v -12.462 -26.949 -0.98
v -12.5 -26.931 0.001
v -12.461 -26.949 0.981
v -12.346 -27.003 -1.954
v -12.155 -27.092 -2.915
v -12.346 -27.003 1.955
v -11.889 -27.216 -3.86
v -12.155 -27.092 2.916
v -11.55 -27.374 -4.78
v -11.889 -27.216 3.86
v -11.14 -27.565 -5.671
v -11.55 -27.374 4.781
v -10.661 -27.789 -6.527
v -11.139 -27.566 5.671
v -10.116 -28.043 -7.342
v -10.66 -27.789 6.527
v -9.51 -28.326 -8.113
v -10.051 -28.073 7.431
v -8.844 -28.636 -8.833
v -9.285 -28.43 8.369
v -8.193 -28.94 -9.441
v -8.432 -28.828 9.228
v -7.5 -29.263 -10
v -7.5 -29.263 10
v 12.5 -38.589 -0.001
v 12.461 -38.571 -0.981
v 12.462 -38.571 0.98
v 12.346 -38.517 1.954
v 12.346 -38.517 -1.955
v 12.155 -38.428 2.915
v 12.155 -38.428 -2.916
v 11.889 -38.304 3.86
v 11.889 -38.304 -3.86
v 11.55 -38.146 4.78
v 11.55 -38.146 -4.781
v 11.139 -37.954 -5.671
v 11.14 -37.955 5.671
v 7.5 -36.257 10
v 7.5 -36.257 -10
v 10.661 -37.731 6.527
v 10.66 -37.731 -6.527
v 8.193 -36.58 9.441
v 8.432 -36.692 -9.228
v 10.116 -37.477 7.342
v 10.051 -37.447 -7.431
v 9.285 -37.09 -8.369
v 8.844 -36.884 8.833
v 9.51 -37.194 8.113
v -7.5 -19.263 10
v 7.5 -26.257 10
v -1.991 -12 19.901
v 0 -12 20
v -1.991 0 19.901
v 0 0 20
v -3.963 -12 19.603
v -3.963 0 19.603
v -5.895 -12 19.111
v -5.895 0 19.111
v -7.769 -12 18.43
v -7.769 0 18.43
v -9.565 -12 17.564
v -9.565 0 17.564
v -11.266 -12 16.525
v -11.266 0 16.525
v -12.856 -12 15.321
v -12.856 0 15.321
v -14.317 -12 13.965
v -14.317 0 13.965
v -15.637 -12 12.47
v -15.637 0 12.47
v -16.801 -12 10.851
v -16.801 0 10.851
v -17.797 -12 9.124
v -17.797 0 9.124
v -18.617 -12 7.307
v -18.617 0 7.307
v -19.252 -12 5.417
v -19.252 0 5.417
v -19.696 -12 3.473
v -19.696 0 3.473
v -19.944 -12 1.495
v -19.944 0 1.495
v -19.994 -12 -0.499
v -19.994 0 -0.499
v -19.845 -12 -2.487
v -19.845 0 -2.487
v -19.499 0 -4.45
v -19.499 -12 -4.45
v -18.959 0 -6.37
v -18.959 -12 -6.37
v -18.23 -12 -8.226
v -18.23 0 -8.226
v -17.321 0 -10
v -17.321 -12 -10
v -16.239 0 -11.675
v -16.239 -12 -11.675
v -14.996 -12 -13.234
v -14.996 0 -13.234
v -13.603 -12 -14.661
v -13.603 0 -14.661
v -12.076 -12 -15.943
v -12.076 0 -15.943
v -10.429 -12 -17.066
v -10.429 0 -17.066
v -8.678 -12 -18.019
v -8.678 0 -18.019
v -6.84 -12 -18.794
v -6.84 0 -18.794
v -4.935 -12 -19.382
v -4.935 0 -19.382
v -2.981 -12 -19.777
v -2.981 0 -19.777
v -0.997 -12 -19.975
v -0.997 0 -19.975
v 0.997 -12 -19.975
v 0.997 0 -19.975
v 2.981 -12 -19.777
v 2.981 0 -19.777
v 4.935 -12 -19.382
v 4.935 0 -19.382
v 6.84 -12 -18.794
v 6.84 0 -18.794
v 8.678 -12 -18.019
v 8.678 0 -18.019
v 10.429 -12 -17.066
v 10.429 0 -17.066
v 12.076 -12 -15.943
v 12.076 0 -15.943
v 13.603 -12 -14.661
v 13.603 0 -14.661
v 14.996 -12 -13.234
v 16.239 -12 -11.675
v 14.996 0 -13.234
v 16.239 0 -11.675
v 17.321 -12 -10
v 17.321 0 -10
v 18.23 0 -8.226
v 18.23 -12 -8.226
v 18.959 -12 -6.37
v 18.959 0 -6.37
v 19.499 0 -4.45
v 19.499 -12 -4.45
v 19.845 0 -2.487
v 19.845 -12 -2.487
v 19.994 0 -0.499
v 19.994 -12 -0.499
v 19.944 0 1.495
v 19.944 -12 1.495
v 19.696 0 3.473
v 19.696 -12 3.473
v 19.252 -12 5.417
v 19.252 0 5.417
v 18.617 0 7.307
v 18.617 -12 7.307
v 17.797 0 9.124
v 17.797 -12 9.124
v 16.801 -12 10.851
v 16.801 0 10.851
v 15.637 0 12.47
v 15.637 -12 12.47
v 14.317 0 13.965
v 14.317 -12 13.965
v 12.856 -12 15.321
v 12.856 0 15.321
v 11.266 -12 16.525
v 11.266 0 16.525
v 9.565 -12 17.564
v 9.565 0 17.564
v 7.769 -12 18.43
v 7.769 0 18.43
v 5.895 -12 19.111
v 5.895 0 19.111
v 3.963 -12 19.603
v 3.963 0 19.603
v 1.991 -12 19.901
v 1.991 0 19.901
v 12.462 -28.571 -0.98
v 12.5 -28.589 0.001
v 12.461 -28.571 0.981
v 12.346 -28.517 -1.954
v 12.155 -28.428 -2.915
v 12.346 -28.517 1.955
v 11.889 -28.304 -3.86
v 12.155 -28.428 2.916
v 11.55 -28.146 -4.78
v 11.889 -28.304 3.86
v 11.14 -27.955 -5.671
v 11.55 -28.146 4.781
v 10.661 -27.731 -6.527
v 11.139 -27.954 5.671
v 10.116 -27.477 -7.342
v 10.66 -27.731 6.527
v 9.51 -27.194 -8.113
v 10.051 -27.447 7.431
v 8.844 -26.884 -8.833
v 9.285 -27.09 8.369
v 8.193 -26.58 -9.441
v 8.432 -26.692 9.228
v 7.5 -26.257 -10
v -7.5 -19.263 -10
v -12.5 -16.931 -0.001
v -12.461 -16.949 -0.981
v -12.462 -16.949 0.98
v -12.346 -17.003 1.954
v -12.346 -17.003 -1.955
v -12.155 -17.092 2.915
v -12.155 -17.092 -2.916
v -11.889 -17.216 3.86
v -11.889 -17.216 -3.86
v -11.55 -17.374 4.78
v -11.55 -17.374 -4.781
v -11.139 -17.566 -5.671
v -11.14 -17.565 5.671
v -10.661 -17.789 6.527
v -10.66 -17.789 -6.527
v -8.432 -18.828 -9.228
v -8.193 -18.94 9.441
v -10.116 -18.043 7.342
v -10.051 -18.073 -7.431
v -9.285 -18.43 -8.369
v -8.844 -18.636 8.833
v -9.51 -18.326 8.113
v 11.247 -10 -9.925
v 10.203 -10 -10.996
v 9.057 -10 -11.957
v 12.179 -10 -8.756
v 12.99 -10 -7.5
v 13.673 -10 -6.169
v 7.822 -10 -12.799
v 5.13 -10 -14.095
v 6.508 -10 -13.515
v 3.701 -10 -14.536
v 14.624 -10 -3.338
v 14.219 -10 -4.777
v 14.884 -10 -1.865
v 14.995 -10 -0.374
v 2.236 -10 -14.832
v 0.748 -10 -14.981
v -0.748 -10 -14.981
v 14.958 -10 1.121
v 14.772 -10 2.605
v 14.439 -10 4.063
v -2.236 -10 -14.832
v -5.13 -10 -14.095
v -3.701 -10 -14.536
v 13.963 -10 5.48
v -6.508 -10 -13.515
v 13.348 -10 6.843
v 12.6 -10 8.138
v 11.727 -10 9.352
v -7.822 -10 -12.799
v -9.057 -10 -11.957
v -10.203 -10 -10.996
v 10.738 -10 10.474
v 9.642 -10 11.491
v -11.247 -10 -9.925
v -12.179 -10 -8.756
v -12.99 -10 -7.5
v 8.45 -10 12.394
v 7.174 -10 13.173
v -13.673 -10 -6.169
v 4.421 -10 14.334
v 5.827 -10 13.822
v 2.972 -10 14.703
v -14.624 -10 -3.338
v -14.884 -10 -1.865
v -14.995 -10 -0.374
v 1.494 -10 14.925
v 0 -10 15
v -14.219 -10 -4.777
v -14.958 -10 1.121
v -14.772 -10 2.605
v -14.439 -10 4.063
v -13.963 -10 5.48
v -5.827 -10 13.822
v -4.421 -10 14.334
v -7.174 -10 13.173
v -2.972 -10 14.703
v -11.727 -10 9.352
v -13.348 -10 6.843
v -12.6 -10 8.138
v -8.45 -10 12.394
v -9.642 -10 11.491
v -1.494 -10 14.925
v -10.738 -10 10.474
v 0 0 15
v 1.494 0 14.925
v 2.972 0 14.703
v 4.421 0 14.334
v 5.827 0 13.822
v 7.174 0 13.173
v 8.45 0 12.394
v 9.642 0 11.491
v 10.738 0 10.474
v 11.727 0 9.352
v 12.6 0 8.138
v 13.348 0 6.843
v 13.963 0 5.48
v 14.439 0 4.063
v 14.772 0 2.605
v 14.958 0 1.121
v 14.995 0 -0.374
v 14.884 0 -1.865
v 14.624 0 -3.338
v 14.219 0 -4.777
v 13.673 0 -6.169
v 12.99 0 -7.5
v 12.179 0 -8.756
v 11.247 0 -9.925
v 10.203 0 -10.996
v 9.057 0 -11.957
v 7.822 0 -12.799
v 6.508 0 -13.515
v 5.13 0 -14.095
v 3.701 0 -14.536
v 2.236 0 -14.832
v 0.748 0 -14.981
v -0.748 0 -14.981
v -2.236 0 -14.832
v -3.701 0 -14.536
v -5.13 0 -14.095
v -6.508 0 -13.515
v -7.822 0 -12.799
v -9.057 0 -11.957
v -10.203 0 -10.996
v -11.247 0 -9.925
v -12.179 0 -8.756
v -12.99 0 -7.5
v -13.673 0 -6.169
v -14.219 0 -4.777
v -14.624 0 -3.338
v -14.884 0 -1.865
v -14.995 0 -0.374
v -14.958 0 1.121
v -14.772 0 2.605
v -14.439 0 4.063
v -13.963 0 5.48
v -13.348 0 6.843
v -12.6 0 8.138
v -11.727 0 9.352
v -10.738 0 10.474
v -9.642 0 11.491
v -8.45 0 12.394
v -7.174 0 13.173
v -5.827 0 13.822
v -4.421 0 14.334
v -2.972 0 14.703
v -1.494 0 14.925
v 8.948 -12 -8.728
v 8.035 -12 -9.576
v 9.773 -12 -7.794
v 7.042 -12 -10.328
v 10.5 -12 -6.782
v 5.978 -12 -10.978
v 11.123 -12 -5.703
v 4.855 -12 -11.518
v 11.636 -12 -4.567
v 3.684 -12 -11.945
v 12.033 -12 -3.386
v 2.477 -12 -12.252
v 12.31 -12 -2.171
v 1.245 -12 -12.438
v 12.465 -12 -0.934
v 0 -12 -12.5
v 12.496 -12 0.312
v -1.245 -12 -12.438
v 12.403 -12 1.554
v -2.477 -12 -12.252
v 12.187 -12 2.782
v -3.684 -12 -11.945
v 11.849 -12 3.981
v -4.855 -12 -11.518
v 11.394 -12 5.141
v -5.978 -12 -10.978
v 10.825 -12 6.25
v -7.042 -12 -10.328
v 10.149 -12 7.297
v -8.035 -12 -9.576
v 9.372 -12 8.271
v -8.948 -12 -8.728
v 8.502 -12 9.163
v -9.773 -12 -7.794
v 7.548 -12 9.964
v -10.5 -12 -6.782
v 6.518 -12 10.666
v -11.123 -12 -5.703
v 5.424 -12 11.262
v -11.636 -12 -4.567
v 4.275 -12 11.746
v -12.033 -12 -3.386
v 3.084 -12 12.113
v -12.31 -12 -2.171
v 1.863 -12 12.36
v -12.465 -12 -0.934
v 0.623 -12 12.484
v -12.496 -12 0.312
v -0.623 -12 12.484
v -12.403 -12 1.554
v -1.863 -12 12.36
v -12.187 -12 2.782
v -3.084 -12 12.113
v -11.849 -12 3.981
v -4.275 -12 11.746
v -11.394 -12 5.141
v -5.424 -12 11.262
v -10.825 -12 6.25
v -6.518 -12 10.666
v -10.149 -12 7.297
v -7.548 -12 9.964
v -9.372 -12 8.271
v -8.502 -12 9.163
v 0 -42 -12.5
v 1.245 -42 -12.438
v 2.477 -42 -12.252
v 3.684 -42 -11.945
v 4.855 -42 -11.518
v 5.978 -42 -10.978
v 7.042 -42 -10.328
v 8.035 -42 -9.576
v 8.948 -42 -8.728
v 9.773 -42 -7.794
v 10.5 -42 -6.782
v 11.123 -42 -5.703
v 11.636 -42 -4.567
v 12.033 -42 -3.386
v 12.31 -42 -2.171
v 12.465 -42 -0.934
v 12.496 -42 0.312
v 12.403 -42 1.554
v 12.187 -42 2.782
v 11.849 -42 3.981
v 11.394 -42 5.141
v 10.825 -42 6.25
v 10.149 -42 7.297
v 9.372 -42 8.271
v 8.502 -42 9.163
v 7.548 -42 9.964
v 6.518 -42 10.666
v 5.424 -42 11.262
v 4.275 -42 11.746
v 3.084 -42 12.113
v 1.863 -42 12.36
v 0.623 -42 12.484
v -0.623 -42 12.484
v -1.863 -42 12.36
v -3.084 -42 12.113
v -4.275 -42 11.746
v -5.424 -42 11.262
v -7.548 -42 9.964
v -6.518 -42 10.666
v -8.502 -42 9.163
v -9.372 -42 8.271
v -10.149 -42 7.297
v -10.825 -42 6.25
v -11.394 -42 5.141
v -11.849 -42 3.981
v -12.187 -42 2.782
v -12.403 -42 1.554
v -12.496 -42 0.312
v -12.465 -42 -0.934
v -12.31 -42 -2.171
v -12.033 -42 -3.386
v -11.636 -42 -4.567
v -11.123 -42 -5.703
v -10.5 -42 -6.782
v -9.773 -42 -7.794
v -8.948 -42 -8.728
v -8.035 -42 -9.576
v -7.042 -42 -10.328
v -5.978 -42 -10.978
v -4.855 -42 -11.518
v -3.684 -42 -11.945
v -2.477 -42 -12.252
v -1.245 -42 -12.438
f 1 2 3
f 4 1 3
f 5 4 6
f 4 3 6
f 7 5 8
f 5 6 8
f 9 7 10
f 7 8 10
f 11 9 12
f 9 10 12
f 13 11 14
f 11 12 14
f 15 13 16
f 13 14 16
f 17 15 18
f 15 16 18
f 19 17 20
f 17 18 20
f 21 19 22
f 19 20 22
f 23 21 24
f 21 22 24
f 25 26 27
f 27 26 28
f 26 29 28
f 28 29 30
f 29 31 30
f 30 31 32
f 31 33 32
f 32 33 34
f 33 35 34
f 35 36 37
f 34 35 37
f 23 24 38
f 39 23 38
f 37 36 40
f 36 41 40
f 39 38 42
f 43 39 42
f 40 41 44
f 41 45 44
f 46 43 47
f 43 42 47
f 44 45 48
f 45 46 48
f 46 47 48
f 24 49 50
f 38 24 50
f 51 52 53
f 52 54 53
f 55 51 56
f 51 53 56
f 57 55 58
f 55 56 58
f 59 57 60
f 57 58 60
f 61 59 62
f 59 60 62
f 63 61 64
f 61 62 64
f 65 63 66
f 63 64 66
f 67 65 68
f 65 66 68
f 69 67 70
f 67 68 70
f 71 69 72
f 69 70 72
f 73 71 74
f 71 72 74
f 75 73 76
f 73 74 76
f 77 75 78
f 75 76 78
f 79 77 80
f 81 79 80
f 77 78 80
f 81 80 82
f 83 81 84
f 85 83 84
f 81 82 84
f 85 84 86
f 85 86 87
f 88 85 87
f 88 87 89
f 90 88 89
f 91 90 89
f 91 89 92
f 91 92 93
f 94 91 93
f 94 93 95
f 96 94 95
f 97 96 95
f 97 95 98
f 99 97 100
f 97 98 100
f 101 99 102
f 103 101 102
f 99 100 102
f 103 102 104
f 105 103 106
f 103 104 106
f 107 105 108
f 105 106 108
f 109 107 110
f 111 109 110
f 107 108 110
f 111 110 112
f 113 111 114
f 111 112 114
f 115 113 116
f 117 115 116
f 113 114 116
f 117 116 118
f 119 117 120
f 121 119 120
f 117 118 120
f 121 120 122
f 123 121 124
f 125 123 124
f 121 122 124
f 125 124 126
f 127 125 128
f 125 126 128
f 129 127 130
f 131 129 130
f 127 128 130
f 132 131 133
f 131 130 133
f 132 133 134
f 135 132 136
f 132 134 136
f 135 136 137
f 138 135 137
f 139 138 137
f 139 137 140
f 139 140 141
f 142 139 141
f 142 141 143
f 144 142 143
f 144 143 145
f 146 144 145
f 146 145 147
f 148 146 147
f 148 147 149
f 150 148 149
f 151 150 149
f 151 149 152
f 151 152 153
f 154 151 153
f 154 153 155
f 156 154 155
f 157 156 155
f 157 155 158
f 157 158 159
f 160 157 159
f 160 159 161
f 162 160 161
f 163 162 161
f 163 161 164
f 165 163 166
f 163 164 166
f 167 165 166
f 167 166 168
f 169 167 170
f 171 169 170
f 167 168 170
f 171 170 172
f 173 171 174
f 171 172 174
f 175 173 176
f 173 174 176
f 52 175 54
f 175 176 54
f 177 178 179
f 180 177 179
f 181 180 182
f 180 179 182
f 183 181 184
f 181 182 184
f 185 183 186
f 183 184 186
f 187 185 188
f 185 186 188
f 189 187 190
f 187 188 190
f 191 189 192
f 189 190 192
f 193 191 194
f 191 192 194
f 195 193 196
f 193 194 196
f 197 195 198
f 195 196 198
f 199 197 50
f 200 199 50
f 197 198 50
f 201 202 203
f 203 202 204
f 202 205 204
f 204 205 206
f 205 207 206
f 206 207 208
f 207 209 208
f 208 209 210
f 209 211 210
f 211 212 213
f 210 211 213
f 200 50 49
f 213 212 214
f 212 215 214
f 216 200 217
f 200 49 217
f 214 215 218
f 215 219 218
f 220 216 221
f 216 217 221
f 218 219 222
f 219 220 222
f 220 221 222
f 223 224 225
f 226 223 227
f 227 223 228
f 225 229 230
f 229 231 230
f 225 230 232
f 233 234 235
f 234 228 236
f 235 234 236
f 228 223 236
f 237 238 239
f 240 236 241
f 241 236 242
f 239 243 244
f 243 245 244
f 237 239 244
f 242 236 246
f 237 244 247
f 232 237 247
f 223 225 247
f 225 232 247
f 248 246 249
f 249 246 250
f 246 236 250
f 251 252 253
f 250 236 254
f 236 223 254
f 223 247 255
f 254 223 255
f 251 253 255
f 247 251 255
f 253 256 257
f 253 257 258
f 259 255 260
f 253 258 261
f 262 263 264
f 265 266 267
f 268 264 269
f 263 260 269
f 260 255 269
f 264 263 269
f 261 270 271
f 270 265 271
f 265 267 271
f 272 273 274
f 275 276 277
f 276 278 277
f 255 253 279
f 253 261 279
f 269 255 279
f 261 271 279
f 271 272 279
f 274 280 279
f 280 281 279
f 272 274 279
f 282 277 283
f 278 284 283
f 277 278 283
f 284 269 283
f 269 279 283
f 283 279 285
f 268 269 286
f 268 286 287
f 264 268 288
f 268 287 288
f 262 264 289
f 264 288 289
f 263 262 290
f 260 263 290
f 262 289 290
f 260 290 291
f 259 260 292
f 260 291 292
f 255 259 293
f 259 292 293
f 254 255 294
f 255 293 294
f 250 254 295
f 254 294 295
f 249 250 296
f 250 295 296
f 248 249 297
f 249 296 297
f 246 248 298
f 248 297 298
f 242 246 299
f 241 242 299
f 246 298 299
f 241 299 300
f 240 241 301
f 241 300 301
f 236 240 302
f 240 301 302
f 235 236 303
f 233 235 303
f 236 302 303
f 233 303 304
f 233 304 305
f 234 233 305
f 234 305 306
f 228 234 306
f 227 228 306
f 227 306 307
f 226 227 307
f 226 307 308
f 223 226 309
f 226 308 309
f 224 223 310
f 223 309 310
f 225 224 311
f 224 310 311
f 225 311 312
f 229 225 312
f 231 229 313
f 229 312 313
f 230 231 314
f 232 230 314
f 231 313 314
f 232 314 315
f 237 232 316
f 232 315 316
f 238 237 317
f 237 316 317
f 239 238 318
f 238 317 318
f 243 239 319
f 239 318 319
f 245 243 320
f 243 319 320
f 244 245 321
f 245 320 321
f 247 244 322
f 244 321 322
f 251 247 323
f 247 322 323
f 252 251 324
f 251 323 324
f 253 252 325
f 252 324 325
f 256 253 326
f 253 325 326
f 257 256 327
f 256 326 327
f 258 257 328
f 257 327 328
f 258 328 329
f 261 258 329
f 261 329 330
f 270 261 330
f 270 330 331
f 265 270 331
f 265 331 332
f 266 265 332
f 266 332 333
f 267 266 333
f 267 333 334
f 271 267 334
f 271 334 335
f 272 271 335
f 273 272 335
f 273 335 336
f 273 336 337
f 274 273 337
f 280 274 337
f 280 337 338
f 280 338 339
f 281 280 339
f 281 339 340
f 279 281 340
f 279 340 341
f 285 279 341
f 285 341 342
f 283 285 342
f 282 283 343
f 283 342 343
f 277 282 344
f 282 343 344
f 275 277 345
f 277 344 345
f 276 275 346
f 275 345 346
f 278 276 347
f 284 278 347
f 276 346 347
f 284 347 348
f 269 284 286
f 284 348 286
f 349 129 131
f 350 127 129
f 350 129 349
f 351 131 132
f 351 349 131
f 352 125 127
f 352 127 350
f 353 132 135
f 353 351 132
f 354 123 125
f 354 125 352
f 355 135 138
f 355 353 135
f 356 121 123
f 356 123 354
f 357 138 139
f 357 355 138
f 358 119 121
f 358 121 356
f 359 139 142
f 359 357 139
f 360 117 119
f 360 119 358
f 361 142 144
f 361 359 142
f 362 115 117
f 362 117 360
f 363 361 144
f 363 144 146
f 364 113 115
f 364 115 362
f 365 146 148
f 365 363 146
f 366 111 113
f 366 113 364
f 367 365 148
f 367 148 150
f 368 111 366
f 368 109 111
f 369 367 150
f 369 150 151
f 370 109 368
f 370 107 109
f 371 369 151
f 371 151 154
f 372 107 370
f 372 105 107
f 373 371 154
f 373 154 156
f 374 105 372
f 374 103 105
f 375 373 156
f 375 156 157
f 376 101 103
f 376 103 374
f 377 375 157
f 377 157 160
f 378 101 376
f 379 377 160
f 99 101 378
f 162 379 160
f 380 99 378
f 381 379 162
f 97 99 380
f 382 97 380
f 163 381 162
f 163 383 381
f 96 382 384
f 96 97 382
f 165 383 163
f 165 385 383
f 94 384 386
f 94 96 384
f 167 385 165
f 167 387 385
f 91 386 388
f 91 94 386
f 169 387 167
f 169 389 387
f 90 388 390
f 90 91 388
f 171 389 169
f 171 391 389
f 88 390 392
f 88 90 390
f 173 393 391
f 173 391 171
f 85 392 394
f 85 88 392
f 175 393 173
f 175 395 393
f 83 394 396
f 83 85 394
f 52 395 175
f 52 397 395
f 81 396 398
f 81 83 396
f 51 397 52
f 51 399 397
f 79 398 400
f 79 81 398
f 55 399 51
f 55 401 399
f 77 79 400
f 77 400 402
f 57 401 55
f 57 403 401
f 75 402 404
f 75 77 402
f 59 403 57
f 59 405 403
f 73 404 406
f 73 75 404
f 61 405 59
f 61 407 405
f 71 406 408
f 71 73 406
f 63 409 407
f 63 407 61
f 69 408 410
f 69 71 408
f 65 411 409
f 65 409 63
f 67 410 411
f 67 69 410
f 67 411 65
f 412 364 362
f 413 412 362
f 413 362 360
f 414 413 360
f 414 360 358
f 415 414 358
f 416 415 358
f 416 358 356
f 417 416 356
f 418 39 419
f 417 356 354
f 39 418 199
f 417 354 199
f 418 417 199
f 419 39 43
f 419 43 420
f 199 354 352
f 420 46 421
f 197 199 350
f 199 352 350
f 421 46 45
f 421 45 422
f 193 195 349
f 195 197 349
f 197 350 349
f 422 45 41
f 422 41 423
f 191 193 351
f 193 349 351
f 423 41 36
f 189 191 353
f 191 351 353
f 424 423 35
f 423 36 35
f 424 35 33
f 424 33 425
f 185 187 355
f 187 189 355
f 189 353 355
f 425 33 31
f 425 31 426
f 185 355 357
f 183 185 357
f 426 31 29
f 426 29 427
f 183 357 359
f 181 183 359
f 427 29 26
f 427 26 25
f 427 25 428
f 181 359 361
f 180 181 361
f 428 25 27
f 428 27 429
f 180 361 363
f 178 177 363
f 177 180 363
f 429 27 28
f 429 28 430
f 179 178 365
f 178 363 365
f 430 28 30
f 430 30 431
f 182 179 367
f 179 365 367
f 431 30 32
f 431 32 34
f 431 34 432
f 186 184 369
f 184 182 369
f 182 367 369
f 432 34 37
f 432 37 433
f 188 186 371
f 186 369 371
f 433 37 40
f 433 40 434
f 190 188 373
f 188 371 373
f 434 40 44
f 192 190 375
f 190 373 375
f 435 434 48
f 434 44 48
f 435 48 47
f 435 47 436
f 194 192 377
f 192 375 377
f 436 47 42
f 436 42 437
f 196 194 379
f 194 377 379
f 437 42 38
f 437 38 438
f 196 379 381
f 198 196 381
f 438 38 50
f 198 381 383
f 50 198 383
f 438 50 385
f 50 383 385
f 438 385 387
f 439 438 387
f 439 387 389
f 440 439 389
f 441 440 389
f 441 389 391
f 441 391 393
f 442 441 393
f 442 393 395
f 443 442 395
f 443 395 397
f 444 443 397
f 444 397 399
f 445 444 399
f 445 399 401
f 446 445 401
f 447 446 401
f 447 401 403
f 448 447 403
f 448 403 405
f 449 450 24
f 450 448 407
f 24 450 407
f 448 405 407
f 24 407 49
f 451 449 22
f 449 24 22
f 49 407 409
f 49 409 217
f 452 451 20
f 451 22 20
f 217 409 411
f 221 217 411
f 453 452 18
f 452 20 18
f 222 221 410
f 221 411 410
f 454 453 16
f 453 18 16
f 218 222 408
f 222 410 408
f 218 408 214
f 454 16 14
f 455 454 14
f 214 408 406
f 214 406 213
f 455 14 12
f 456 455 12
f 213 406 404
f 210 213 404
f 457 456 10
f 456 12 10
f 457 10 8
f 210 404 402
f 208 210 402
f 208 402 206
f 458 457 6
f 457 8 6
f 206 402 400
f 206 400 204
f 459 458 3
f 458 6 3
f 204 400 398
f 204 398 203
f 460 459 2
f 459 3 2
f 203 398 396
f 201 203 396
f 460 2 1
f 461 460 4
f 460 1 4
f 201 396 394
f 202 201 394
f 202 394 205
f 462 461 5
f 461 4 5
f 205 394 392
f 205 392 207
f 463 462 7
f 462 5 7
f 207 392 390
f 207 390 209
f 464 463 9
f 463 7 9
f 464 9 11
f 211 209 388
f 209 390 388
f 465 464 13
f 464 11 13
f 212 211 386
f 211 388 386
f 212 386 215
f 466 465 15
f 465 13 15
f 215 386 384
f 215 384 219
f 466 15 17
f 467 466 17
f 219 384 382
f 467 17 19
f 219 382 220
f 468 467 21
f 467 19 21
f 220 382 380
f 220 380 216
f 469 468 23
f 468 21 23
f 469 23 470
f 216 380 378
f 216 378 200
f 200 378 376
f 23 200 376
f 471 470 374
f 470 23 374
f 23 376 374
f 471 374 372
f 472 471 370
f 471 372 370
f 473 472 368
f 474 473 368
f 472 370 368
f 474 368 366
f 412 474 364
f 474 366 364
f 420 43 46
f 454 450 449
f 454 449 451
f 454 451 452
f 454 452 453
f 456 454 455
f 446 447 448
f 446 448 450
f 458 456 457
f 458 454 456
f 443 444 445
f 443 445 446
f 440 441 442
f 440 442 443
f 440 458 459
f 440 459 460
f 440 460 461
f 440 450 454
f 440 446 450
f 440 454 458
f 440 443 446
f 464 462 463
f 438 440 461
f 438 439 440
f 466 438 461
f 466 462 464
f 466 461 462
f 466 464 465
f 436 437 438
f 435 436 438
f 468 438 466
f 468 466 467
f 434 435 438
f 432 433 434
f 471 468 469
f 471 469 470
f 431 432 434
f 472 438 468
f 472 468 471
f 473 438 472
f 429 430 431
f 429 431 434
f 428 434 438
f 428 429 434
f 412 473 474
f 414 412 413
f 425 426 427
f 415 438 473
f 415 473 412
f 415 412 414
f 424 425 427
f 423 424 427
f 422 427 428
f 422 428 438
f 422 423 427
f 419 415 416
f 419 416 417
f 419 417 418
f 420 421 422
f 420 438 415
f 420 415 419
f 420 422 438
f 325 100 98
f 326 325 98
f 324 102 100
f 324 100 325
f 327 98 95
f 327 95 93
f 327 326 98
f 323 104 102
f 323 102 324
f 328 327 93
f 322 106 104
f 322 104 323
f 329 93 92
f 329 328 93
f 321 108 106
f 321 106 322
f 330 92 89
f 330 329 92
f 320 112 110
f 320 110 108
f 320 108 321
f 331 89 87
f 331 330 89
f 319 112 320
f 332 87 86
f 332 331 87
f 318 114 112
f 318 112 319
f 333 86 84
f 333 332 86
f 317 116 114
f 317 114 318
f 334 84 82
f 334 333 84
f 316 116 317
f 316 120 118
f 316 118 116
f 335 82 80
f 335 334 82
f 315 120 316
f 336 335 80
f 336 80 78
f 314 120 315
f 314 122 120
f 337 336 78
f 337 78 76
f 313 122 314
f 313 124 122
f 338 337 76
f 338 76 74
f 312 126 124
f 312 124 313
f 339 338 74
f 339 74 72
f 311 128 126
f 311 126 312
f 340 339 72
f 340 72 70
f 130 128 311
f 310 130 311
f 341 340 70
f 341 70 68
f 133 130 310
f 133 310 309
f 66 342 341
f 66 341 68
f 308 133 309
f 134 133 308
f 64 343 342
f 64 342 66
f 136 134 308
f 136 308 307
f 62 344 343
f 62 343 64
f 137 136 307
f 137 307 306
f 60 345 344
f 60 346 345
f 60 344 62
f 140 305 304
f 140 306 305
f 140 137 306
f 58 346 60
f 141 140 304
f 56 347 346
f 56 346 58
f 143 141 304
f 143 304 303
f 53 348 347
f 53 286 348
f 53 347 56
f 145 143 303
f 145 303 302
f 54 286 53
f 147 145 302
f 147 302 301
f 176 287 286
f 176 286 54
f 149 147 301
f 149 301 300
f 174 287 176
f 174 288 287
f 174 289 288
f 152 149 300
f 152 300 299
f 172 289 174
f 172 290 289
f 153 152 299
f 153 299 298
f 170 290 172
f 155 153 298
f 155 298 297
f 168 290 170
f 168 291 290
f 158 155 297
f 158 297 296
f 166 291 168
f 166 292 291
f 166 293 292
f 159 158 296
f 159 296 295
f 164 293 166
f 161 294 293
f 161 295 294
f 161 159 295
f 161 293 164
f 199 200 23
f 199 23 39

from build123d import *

# Parameters (mm, degrees)
CROQUIS1_R              = 20
CROQUIS1_R_2            = 15
SALIENTE_EXTRUIR1_DEPTH = 10
CROQUIS2_R              = 20
SALIENTE_EXTRUIR2_DEPTH = 2
CROQUIS3_R              = 12.5
SALIENTE_EXTRUIR3_DEPTH = 30
CORTAR_EXTRUIR2_DEPTH   = 10


with BuildPart() as part:
    # Croquis1 → Saliente-Extruir1 (new body)
    with BuildSketch(Plane(origin=(0, 0, 0), x_dir=(1, 0, 0), z_dir=(0, 1, 0))):
        with Locations(Location((0, 0, 0), (0, 0, 270))):
            Circle(CROQUIS1_R)
        with Locations(Location((0, 0, 0), (0, 0, 270))):
            Circle(CROQUIS1_R_2, mode=Mode.SUBTRACT)
    extrude(amount=-SALIENTE_EXTRUIR1_DEPTH)

    # Croquis2 → Saliente-Extruir2 (add)
    with BuildSketch(Plane.XZ.offset(10)):
        with Locations(Location((0, 0, 0), (0, 0, 90))):
            Circle(CROQUIS2_R)
    extrude(amount=SALIENTE_EXTRUIR2_DEPTH)

    # Croquis3 → Saliente-Extruir3 (add)
    with BuildSketch(Plane.XZ.offset(12)):
        with Locations(Location((0, 0, 0), (0, 0, 270))):
            Circle(CROQUIS3_R)
    extrude(amount=SALIENTE_EXTRUIR3_DEPTH)

    # Croquis4 → Cortar-Extruir2 (cut, symmetric)
    with BuildSketch(Plane.XY):
        Polygon((-15.546090629, -15.510770255), (-15.546090629, -25.510770255), (14.453909371, -39.5), (14.453909371, -29.5), align=None)
    extrude(amount=CORTAR_EXTRUIR2_DEPTH, both=True, mode=Mode.SUBTRACT)


solid = part.part
